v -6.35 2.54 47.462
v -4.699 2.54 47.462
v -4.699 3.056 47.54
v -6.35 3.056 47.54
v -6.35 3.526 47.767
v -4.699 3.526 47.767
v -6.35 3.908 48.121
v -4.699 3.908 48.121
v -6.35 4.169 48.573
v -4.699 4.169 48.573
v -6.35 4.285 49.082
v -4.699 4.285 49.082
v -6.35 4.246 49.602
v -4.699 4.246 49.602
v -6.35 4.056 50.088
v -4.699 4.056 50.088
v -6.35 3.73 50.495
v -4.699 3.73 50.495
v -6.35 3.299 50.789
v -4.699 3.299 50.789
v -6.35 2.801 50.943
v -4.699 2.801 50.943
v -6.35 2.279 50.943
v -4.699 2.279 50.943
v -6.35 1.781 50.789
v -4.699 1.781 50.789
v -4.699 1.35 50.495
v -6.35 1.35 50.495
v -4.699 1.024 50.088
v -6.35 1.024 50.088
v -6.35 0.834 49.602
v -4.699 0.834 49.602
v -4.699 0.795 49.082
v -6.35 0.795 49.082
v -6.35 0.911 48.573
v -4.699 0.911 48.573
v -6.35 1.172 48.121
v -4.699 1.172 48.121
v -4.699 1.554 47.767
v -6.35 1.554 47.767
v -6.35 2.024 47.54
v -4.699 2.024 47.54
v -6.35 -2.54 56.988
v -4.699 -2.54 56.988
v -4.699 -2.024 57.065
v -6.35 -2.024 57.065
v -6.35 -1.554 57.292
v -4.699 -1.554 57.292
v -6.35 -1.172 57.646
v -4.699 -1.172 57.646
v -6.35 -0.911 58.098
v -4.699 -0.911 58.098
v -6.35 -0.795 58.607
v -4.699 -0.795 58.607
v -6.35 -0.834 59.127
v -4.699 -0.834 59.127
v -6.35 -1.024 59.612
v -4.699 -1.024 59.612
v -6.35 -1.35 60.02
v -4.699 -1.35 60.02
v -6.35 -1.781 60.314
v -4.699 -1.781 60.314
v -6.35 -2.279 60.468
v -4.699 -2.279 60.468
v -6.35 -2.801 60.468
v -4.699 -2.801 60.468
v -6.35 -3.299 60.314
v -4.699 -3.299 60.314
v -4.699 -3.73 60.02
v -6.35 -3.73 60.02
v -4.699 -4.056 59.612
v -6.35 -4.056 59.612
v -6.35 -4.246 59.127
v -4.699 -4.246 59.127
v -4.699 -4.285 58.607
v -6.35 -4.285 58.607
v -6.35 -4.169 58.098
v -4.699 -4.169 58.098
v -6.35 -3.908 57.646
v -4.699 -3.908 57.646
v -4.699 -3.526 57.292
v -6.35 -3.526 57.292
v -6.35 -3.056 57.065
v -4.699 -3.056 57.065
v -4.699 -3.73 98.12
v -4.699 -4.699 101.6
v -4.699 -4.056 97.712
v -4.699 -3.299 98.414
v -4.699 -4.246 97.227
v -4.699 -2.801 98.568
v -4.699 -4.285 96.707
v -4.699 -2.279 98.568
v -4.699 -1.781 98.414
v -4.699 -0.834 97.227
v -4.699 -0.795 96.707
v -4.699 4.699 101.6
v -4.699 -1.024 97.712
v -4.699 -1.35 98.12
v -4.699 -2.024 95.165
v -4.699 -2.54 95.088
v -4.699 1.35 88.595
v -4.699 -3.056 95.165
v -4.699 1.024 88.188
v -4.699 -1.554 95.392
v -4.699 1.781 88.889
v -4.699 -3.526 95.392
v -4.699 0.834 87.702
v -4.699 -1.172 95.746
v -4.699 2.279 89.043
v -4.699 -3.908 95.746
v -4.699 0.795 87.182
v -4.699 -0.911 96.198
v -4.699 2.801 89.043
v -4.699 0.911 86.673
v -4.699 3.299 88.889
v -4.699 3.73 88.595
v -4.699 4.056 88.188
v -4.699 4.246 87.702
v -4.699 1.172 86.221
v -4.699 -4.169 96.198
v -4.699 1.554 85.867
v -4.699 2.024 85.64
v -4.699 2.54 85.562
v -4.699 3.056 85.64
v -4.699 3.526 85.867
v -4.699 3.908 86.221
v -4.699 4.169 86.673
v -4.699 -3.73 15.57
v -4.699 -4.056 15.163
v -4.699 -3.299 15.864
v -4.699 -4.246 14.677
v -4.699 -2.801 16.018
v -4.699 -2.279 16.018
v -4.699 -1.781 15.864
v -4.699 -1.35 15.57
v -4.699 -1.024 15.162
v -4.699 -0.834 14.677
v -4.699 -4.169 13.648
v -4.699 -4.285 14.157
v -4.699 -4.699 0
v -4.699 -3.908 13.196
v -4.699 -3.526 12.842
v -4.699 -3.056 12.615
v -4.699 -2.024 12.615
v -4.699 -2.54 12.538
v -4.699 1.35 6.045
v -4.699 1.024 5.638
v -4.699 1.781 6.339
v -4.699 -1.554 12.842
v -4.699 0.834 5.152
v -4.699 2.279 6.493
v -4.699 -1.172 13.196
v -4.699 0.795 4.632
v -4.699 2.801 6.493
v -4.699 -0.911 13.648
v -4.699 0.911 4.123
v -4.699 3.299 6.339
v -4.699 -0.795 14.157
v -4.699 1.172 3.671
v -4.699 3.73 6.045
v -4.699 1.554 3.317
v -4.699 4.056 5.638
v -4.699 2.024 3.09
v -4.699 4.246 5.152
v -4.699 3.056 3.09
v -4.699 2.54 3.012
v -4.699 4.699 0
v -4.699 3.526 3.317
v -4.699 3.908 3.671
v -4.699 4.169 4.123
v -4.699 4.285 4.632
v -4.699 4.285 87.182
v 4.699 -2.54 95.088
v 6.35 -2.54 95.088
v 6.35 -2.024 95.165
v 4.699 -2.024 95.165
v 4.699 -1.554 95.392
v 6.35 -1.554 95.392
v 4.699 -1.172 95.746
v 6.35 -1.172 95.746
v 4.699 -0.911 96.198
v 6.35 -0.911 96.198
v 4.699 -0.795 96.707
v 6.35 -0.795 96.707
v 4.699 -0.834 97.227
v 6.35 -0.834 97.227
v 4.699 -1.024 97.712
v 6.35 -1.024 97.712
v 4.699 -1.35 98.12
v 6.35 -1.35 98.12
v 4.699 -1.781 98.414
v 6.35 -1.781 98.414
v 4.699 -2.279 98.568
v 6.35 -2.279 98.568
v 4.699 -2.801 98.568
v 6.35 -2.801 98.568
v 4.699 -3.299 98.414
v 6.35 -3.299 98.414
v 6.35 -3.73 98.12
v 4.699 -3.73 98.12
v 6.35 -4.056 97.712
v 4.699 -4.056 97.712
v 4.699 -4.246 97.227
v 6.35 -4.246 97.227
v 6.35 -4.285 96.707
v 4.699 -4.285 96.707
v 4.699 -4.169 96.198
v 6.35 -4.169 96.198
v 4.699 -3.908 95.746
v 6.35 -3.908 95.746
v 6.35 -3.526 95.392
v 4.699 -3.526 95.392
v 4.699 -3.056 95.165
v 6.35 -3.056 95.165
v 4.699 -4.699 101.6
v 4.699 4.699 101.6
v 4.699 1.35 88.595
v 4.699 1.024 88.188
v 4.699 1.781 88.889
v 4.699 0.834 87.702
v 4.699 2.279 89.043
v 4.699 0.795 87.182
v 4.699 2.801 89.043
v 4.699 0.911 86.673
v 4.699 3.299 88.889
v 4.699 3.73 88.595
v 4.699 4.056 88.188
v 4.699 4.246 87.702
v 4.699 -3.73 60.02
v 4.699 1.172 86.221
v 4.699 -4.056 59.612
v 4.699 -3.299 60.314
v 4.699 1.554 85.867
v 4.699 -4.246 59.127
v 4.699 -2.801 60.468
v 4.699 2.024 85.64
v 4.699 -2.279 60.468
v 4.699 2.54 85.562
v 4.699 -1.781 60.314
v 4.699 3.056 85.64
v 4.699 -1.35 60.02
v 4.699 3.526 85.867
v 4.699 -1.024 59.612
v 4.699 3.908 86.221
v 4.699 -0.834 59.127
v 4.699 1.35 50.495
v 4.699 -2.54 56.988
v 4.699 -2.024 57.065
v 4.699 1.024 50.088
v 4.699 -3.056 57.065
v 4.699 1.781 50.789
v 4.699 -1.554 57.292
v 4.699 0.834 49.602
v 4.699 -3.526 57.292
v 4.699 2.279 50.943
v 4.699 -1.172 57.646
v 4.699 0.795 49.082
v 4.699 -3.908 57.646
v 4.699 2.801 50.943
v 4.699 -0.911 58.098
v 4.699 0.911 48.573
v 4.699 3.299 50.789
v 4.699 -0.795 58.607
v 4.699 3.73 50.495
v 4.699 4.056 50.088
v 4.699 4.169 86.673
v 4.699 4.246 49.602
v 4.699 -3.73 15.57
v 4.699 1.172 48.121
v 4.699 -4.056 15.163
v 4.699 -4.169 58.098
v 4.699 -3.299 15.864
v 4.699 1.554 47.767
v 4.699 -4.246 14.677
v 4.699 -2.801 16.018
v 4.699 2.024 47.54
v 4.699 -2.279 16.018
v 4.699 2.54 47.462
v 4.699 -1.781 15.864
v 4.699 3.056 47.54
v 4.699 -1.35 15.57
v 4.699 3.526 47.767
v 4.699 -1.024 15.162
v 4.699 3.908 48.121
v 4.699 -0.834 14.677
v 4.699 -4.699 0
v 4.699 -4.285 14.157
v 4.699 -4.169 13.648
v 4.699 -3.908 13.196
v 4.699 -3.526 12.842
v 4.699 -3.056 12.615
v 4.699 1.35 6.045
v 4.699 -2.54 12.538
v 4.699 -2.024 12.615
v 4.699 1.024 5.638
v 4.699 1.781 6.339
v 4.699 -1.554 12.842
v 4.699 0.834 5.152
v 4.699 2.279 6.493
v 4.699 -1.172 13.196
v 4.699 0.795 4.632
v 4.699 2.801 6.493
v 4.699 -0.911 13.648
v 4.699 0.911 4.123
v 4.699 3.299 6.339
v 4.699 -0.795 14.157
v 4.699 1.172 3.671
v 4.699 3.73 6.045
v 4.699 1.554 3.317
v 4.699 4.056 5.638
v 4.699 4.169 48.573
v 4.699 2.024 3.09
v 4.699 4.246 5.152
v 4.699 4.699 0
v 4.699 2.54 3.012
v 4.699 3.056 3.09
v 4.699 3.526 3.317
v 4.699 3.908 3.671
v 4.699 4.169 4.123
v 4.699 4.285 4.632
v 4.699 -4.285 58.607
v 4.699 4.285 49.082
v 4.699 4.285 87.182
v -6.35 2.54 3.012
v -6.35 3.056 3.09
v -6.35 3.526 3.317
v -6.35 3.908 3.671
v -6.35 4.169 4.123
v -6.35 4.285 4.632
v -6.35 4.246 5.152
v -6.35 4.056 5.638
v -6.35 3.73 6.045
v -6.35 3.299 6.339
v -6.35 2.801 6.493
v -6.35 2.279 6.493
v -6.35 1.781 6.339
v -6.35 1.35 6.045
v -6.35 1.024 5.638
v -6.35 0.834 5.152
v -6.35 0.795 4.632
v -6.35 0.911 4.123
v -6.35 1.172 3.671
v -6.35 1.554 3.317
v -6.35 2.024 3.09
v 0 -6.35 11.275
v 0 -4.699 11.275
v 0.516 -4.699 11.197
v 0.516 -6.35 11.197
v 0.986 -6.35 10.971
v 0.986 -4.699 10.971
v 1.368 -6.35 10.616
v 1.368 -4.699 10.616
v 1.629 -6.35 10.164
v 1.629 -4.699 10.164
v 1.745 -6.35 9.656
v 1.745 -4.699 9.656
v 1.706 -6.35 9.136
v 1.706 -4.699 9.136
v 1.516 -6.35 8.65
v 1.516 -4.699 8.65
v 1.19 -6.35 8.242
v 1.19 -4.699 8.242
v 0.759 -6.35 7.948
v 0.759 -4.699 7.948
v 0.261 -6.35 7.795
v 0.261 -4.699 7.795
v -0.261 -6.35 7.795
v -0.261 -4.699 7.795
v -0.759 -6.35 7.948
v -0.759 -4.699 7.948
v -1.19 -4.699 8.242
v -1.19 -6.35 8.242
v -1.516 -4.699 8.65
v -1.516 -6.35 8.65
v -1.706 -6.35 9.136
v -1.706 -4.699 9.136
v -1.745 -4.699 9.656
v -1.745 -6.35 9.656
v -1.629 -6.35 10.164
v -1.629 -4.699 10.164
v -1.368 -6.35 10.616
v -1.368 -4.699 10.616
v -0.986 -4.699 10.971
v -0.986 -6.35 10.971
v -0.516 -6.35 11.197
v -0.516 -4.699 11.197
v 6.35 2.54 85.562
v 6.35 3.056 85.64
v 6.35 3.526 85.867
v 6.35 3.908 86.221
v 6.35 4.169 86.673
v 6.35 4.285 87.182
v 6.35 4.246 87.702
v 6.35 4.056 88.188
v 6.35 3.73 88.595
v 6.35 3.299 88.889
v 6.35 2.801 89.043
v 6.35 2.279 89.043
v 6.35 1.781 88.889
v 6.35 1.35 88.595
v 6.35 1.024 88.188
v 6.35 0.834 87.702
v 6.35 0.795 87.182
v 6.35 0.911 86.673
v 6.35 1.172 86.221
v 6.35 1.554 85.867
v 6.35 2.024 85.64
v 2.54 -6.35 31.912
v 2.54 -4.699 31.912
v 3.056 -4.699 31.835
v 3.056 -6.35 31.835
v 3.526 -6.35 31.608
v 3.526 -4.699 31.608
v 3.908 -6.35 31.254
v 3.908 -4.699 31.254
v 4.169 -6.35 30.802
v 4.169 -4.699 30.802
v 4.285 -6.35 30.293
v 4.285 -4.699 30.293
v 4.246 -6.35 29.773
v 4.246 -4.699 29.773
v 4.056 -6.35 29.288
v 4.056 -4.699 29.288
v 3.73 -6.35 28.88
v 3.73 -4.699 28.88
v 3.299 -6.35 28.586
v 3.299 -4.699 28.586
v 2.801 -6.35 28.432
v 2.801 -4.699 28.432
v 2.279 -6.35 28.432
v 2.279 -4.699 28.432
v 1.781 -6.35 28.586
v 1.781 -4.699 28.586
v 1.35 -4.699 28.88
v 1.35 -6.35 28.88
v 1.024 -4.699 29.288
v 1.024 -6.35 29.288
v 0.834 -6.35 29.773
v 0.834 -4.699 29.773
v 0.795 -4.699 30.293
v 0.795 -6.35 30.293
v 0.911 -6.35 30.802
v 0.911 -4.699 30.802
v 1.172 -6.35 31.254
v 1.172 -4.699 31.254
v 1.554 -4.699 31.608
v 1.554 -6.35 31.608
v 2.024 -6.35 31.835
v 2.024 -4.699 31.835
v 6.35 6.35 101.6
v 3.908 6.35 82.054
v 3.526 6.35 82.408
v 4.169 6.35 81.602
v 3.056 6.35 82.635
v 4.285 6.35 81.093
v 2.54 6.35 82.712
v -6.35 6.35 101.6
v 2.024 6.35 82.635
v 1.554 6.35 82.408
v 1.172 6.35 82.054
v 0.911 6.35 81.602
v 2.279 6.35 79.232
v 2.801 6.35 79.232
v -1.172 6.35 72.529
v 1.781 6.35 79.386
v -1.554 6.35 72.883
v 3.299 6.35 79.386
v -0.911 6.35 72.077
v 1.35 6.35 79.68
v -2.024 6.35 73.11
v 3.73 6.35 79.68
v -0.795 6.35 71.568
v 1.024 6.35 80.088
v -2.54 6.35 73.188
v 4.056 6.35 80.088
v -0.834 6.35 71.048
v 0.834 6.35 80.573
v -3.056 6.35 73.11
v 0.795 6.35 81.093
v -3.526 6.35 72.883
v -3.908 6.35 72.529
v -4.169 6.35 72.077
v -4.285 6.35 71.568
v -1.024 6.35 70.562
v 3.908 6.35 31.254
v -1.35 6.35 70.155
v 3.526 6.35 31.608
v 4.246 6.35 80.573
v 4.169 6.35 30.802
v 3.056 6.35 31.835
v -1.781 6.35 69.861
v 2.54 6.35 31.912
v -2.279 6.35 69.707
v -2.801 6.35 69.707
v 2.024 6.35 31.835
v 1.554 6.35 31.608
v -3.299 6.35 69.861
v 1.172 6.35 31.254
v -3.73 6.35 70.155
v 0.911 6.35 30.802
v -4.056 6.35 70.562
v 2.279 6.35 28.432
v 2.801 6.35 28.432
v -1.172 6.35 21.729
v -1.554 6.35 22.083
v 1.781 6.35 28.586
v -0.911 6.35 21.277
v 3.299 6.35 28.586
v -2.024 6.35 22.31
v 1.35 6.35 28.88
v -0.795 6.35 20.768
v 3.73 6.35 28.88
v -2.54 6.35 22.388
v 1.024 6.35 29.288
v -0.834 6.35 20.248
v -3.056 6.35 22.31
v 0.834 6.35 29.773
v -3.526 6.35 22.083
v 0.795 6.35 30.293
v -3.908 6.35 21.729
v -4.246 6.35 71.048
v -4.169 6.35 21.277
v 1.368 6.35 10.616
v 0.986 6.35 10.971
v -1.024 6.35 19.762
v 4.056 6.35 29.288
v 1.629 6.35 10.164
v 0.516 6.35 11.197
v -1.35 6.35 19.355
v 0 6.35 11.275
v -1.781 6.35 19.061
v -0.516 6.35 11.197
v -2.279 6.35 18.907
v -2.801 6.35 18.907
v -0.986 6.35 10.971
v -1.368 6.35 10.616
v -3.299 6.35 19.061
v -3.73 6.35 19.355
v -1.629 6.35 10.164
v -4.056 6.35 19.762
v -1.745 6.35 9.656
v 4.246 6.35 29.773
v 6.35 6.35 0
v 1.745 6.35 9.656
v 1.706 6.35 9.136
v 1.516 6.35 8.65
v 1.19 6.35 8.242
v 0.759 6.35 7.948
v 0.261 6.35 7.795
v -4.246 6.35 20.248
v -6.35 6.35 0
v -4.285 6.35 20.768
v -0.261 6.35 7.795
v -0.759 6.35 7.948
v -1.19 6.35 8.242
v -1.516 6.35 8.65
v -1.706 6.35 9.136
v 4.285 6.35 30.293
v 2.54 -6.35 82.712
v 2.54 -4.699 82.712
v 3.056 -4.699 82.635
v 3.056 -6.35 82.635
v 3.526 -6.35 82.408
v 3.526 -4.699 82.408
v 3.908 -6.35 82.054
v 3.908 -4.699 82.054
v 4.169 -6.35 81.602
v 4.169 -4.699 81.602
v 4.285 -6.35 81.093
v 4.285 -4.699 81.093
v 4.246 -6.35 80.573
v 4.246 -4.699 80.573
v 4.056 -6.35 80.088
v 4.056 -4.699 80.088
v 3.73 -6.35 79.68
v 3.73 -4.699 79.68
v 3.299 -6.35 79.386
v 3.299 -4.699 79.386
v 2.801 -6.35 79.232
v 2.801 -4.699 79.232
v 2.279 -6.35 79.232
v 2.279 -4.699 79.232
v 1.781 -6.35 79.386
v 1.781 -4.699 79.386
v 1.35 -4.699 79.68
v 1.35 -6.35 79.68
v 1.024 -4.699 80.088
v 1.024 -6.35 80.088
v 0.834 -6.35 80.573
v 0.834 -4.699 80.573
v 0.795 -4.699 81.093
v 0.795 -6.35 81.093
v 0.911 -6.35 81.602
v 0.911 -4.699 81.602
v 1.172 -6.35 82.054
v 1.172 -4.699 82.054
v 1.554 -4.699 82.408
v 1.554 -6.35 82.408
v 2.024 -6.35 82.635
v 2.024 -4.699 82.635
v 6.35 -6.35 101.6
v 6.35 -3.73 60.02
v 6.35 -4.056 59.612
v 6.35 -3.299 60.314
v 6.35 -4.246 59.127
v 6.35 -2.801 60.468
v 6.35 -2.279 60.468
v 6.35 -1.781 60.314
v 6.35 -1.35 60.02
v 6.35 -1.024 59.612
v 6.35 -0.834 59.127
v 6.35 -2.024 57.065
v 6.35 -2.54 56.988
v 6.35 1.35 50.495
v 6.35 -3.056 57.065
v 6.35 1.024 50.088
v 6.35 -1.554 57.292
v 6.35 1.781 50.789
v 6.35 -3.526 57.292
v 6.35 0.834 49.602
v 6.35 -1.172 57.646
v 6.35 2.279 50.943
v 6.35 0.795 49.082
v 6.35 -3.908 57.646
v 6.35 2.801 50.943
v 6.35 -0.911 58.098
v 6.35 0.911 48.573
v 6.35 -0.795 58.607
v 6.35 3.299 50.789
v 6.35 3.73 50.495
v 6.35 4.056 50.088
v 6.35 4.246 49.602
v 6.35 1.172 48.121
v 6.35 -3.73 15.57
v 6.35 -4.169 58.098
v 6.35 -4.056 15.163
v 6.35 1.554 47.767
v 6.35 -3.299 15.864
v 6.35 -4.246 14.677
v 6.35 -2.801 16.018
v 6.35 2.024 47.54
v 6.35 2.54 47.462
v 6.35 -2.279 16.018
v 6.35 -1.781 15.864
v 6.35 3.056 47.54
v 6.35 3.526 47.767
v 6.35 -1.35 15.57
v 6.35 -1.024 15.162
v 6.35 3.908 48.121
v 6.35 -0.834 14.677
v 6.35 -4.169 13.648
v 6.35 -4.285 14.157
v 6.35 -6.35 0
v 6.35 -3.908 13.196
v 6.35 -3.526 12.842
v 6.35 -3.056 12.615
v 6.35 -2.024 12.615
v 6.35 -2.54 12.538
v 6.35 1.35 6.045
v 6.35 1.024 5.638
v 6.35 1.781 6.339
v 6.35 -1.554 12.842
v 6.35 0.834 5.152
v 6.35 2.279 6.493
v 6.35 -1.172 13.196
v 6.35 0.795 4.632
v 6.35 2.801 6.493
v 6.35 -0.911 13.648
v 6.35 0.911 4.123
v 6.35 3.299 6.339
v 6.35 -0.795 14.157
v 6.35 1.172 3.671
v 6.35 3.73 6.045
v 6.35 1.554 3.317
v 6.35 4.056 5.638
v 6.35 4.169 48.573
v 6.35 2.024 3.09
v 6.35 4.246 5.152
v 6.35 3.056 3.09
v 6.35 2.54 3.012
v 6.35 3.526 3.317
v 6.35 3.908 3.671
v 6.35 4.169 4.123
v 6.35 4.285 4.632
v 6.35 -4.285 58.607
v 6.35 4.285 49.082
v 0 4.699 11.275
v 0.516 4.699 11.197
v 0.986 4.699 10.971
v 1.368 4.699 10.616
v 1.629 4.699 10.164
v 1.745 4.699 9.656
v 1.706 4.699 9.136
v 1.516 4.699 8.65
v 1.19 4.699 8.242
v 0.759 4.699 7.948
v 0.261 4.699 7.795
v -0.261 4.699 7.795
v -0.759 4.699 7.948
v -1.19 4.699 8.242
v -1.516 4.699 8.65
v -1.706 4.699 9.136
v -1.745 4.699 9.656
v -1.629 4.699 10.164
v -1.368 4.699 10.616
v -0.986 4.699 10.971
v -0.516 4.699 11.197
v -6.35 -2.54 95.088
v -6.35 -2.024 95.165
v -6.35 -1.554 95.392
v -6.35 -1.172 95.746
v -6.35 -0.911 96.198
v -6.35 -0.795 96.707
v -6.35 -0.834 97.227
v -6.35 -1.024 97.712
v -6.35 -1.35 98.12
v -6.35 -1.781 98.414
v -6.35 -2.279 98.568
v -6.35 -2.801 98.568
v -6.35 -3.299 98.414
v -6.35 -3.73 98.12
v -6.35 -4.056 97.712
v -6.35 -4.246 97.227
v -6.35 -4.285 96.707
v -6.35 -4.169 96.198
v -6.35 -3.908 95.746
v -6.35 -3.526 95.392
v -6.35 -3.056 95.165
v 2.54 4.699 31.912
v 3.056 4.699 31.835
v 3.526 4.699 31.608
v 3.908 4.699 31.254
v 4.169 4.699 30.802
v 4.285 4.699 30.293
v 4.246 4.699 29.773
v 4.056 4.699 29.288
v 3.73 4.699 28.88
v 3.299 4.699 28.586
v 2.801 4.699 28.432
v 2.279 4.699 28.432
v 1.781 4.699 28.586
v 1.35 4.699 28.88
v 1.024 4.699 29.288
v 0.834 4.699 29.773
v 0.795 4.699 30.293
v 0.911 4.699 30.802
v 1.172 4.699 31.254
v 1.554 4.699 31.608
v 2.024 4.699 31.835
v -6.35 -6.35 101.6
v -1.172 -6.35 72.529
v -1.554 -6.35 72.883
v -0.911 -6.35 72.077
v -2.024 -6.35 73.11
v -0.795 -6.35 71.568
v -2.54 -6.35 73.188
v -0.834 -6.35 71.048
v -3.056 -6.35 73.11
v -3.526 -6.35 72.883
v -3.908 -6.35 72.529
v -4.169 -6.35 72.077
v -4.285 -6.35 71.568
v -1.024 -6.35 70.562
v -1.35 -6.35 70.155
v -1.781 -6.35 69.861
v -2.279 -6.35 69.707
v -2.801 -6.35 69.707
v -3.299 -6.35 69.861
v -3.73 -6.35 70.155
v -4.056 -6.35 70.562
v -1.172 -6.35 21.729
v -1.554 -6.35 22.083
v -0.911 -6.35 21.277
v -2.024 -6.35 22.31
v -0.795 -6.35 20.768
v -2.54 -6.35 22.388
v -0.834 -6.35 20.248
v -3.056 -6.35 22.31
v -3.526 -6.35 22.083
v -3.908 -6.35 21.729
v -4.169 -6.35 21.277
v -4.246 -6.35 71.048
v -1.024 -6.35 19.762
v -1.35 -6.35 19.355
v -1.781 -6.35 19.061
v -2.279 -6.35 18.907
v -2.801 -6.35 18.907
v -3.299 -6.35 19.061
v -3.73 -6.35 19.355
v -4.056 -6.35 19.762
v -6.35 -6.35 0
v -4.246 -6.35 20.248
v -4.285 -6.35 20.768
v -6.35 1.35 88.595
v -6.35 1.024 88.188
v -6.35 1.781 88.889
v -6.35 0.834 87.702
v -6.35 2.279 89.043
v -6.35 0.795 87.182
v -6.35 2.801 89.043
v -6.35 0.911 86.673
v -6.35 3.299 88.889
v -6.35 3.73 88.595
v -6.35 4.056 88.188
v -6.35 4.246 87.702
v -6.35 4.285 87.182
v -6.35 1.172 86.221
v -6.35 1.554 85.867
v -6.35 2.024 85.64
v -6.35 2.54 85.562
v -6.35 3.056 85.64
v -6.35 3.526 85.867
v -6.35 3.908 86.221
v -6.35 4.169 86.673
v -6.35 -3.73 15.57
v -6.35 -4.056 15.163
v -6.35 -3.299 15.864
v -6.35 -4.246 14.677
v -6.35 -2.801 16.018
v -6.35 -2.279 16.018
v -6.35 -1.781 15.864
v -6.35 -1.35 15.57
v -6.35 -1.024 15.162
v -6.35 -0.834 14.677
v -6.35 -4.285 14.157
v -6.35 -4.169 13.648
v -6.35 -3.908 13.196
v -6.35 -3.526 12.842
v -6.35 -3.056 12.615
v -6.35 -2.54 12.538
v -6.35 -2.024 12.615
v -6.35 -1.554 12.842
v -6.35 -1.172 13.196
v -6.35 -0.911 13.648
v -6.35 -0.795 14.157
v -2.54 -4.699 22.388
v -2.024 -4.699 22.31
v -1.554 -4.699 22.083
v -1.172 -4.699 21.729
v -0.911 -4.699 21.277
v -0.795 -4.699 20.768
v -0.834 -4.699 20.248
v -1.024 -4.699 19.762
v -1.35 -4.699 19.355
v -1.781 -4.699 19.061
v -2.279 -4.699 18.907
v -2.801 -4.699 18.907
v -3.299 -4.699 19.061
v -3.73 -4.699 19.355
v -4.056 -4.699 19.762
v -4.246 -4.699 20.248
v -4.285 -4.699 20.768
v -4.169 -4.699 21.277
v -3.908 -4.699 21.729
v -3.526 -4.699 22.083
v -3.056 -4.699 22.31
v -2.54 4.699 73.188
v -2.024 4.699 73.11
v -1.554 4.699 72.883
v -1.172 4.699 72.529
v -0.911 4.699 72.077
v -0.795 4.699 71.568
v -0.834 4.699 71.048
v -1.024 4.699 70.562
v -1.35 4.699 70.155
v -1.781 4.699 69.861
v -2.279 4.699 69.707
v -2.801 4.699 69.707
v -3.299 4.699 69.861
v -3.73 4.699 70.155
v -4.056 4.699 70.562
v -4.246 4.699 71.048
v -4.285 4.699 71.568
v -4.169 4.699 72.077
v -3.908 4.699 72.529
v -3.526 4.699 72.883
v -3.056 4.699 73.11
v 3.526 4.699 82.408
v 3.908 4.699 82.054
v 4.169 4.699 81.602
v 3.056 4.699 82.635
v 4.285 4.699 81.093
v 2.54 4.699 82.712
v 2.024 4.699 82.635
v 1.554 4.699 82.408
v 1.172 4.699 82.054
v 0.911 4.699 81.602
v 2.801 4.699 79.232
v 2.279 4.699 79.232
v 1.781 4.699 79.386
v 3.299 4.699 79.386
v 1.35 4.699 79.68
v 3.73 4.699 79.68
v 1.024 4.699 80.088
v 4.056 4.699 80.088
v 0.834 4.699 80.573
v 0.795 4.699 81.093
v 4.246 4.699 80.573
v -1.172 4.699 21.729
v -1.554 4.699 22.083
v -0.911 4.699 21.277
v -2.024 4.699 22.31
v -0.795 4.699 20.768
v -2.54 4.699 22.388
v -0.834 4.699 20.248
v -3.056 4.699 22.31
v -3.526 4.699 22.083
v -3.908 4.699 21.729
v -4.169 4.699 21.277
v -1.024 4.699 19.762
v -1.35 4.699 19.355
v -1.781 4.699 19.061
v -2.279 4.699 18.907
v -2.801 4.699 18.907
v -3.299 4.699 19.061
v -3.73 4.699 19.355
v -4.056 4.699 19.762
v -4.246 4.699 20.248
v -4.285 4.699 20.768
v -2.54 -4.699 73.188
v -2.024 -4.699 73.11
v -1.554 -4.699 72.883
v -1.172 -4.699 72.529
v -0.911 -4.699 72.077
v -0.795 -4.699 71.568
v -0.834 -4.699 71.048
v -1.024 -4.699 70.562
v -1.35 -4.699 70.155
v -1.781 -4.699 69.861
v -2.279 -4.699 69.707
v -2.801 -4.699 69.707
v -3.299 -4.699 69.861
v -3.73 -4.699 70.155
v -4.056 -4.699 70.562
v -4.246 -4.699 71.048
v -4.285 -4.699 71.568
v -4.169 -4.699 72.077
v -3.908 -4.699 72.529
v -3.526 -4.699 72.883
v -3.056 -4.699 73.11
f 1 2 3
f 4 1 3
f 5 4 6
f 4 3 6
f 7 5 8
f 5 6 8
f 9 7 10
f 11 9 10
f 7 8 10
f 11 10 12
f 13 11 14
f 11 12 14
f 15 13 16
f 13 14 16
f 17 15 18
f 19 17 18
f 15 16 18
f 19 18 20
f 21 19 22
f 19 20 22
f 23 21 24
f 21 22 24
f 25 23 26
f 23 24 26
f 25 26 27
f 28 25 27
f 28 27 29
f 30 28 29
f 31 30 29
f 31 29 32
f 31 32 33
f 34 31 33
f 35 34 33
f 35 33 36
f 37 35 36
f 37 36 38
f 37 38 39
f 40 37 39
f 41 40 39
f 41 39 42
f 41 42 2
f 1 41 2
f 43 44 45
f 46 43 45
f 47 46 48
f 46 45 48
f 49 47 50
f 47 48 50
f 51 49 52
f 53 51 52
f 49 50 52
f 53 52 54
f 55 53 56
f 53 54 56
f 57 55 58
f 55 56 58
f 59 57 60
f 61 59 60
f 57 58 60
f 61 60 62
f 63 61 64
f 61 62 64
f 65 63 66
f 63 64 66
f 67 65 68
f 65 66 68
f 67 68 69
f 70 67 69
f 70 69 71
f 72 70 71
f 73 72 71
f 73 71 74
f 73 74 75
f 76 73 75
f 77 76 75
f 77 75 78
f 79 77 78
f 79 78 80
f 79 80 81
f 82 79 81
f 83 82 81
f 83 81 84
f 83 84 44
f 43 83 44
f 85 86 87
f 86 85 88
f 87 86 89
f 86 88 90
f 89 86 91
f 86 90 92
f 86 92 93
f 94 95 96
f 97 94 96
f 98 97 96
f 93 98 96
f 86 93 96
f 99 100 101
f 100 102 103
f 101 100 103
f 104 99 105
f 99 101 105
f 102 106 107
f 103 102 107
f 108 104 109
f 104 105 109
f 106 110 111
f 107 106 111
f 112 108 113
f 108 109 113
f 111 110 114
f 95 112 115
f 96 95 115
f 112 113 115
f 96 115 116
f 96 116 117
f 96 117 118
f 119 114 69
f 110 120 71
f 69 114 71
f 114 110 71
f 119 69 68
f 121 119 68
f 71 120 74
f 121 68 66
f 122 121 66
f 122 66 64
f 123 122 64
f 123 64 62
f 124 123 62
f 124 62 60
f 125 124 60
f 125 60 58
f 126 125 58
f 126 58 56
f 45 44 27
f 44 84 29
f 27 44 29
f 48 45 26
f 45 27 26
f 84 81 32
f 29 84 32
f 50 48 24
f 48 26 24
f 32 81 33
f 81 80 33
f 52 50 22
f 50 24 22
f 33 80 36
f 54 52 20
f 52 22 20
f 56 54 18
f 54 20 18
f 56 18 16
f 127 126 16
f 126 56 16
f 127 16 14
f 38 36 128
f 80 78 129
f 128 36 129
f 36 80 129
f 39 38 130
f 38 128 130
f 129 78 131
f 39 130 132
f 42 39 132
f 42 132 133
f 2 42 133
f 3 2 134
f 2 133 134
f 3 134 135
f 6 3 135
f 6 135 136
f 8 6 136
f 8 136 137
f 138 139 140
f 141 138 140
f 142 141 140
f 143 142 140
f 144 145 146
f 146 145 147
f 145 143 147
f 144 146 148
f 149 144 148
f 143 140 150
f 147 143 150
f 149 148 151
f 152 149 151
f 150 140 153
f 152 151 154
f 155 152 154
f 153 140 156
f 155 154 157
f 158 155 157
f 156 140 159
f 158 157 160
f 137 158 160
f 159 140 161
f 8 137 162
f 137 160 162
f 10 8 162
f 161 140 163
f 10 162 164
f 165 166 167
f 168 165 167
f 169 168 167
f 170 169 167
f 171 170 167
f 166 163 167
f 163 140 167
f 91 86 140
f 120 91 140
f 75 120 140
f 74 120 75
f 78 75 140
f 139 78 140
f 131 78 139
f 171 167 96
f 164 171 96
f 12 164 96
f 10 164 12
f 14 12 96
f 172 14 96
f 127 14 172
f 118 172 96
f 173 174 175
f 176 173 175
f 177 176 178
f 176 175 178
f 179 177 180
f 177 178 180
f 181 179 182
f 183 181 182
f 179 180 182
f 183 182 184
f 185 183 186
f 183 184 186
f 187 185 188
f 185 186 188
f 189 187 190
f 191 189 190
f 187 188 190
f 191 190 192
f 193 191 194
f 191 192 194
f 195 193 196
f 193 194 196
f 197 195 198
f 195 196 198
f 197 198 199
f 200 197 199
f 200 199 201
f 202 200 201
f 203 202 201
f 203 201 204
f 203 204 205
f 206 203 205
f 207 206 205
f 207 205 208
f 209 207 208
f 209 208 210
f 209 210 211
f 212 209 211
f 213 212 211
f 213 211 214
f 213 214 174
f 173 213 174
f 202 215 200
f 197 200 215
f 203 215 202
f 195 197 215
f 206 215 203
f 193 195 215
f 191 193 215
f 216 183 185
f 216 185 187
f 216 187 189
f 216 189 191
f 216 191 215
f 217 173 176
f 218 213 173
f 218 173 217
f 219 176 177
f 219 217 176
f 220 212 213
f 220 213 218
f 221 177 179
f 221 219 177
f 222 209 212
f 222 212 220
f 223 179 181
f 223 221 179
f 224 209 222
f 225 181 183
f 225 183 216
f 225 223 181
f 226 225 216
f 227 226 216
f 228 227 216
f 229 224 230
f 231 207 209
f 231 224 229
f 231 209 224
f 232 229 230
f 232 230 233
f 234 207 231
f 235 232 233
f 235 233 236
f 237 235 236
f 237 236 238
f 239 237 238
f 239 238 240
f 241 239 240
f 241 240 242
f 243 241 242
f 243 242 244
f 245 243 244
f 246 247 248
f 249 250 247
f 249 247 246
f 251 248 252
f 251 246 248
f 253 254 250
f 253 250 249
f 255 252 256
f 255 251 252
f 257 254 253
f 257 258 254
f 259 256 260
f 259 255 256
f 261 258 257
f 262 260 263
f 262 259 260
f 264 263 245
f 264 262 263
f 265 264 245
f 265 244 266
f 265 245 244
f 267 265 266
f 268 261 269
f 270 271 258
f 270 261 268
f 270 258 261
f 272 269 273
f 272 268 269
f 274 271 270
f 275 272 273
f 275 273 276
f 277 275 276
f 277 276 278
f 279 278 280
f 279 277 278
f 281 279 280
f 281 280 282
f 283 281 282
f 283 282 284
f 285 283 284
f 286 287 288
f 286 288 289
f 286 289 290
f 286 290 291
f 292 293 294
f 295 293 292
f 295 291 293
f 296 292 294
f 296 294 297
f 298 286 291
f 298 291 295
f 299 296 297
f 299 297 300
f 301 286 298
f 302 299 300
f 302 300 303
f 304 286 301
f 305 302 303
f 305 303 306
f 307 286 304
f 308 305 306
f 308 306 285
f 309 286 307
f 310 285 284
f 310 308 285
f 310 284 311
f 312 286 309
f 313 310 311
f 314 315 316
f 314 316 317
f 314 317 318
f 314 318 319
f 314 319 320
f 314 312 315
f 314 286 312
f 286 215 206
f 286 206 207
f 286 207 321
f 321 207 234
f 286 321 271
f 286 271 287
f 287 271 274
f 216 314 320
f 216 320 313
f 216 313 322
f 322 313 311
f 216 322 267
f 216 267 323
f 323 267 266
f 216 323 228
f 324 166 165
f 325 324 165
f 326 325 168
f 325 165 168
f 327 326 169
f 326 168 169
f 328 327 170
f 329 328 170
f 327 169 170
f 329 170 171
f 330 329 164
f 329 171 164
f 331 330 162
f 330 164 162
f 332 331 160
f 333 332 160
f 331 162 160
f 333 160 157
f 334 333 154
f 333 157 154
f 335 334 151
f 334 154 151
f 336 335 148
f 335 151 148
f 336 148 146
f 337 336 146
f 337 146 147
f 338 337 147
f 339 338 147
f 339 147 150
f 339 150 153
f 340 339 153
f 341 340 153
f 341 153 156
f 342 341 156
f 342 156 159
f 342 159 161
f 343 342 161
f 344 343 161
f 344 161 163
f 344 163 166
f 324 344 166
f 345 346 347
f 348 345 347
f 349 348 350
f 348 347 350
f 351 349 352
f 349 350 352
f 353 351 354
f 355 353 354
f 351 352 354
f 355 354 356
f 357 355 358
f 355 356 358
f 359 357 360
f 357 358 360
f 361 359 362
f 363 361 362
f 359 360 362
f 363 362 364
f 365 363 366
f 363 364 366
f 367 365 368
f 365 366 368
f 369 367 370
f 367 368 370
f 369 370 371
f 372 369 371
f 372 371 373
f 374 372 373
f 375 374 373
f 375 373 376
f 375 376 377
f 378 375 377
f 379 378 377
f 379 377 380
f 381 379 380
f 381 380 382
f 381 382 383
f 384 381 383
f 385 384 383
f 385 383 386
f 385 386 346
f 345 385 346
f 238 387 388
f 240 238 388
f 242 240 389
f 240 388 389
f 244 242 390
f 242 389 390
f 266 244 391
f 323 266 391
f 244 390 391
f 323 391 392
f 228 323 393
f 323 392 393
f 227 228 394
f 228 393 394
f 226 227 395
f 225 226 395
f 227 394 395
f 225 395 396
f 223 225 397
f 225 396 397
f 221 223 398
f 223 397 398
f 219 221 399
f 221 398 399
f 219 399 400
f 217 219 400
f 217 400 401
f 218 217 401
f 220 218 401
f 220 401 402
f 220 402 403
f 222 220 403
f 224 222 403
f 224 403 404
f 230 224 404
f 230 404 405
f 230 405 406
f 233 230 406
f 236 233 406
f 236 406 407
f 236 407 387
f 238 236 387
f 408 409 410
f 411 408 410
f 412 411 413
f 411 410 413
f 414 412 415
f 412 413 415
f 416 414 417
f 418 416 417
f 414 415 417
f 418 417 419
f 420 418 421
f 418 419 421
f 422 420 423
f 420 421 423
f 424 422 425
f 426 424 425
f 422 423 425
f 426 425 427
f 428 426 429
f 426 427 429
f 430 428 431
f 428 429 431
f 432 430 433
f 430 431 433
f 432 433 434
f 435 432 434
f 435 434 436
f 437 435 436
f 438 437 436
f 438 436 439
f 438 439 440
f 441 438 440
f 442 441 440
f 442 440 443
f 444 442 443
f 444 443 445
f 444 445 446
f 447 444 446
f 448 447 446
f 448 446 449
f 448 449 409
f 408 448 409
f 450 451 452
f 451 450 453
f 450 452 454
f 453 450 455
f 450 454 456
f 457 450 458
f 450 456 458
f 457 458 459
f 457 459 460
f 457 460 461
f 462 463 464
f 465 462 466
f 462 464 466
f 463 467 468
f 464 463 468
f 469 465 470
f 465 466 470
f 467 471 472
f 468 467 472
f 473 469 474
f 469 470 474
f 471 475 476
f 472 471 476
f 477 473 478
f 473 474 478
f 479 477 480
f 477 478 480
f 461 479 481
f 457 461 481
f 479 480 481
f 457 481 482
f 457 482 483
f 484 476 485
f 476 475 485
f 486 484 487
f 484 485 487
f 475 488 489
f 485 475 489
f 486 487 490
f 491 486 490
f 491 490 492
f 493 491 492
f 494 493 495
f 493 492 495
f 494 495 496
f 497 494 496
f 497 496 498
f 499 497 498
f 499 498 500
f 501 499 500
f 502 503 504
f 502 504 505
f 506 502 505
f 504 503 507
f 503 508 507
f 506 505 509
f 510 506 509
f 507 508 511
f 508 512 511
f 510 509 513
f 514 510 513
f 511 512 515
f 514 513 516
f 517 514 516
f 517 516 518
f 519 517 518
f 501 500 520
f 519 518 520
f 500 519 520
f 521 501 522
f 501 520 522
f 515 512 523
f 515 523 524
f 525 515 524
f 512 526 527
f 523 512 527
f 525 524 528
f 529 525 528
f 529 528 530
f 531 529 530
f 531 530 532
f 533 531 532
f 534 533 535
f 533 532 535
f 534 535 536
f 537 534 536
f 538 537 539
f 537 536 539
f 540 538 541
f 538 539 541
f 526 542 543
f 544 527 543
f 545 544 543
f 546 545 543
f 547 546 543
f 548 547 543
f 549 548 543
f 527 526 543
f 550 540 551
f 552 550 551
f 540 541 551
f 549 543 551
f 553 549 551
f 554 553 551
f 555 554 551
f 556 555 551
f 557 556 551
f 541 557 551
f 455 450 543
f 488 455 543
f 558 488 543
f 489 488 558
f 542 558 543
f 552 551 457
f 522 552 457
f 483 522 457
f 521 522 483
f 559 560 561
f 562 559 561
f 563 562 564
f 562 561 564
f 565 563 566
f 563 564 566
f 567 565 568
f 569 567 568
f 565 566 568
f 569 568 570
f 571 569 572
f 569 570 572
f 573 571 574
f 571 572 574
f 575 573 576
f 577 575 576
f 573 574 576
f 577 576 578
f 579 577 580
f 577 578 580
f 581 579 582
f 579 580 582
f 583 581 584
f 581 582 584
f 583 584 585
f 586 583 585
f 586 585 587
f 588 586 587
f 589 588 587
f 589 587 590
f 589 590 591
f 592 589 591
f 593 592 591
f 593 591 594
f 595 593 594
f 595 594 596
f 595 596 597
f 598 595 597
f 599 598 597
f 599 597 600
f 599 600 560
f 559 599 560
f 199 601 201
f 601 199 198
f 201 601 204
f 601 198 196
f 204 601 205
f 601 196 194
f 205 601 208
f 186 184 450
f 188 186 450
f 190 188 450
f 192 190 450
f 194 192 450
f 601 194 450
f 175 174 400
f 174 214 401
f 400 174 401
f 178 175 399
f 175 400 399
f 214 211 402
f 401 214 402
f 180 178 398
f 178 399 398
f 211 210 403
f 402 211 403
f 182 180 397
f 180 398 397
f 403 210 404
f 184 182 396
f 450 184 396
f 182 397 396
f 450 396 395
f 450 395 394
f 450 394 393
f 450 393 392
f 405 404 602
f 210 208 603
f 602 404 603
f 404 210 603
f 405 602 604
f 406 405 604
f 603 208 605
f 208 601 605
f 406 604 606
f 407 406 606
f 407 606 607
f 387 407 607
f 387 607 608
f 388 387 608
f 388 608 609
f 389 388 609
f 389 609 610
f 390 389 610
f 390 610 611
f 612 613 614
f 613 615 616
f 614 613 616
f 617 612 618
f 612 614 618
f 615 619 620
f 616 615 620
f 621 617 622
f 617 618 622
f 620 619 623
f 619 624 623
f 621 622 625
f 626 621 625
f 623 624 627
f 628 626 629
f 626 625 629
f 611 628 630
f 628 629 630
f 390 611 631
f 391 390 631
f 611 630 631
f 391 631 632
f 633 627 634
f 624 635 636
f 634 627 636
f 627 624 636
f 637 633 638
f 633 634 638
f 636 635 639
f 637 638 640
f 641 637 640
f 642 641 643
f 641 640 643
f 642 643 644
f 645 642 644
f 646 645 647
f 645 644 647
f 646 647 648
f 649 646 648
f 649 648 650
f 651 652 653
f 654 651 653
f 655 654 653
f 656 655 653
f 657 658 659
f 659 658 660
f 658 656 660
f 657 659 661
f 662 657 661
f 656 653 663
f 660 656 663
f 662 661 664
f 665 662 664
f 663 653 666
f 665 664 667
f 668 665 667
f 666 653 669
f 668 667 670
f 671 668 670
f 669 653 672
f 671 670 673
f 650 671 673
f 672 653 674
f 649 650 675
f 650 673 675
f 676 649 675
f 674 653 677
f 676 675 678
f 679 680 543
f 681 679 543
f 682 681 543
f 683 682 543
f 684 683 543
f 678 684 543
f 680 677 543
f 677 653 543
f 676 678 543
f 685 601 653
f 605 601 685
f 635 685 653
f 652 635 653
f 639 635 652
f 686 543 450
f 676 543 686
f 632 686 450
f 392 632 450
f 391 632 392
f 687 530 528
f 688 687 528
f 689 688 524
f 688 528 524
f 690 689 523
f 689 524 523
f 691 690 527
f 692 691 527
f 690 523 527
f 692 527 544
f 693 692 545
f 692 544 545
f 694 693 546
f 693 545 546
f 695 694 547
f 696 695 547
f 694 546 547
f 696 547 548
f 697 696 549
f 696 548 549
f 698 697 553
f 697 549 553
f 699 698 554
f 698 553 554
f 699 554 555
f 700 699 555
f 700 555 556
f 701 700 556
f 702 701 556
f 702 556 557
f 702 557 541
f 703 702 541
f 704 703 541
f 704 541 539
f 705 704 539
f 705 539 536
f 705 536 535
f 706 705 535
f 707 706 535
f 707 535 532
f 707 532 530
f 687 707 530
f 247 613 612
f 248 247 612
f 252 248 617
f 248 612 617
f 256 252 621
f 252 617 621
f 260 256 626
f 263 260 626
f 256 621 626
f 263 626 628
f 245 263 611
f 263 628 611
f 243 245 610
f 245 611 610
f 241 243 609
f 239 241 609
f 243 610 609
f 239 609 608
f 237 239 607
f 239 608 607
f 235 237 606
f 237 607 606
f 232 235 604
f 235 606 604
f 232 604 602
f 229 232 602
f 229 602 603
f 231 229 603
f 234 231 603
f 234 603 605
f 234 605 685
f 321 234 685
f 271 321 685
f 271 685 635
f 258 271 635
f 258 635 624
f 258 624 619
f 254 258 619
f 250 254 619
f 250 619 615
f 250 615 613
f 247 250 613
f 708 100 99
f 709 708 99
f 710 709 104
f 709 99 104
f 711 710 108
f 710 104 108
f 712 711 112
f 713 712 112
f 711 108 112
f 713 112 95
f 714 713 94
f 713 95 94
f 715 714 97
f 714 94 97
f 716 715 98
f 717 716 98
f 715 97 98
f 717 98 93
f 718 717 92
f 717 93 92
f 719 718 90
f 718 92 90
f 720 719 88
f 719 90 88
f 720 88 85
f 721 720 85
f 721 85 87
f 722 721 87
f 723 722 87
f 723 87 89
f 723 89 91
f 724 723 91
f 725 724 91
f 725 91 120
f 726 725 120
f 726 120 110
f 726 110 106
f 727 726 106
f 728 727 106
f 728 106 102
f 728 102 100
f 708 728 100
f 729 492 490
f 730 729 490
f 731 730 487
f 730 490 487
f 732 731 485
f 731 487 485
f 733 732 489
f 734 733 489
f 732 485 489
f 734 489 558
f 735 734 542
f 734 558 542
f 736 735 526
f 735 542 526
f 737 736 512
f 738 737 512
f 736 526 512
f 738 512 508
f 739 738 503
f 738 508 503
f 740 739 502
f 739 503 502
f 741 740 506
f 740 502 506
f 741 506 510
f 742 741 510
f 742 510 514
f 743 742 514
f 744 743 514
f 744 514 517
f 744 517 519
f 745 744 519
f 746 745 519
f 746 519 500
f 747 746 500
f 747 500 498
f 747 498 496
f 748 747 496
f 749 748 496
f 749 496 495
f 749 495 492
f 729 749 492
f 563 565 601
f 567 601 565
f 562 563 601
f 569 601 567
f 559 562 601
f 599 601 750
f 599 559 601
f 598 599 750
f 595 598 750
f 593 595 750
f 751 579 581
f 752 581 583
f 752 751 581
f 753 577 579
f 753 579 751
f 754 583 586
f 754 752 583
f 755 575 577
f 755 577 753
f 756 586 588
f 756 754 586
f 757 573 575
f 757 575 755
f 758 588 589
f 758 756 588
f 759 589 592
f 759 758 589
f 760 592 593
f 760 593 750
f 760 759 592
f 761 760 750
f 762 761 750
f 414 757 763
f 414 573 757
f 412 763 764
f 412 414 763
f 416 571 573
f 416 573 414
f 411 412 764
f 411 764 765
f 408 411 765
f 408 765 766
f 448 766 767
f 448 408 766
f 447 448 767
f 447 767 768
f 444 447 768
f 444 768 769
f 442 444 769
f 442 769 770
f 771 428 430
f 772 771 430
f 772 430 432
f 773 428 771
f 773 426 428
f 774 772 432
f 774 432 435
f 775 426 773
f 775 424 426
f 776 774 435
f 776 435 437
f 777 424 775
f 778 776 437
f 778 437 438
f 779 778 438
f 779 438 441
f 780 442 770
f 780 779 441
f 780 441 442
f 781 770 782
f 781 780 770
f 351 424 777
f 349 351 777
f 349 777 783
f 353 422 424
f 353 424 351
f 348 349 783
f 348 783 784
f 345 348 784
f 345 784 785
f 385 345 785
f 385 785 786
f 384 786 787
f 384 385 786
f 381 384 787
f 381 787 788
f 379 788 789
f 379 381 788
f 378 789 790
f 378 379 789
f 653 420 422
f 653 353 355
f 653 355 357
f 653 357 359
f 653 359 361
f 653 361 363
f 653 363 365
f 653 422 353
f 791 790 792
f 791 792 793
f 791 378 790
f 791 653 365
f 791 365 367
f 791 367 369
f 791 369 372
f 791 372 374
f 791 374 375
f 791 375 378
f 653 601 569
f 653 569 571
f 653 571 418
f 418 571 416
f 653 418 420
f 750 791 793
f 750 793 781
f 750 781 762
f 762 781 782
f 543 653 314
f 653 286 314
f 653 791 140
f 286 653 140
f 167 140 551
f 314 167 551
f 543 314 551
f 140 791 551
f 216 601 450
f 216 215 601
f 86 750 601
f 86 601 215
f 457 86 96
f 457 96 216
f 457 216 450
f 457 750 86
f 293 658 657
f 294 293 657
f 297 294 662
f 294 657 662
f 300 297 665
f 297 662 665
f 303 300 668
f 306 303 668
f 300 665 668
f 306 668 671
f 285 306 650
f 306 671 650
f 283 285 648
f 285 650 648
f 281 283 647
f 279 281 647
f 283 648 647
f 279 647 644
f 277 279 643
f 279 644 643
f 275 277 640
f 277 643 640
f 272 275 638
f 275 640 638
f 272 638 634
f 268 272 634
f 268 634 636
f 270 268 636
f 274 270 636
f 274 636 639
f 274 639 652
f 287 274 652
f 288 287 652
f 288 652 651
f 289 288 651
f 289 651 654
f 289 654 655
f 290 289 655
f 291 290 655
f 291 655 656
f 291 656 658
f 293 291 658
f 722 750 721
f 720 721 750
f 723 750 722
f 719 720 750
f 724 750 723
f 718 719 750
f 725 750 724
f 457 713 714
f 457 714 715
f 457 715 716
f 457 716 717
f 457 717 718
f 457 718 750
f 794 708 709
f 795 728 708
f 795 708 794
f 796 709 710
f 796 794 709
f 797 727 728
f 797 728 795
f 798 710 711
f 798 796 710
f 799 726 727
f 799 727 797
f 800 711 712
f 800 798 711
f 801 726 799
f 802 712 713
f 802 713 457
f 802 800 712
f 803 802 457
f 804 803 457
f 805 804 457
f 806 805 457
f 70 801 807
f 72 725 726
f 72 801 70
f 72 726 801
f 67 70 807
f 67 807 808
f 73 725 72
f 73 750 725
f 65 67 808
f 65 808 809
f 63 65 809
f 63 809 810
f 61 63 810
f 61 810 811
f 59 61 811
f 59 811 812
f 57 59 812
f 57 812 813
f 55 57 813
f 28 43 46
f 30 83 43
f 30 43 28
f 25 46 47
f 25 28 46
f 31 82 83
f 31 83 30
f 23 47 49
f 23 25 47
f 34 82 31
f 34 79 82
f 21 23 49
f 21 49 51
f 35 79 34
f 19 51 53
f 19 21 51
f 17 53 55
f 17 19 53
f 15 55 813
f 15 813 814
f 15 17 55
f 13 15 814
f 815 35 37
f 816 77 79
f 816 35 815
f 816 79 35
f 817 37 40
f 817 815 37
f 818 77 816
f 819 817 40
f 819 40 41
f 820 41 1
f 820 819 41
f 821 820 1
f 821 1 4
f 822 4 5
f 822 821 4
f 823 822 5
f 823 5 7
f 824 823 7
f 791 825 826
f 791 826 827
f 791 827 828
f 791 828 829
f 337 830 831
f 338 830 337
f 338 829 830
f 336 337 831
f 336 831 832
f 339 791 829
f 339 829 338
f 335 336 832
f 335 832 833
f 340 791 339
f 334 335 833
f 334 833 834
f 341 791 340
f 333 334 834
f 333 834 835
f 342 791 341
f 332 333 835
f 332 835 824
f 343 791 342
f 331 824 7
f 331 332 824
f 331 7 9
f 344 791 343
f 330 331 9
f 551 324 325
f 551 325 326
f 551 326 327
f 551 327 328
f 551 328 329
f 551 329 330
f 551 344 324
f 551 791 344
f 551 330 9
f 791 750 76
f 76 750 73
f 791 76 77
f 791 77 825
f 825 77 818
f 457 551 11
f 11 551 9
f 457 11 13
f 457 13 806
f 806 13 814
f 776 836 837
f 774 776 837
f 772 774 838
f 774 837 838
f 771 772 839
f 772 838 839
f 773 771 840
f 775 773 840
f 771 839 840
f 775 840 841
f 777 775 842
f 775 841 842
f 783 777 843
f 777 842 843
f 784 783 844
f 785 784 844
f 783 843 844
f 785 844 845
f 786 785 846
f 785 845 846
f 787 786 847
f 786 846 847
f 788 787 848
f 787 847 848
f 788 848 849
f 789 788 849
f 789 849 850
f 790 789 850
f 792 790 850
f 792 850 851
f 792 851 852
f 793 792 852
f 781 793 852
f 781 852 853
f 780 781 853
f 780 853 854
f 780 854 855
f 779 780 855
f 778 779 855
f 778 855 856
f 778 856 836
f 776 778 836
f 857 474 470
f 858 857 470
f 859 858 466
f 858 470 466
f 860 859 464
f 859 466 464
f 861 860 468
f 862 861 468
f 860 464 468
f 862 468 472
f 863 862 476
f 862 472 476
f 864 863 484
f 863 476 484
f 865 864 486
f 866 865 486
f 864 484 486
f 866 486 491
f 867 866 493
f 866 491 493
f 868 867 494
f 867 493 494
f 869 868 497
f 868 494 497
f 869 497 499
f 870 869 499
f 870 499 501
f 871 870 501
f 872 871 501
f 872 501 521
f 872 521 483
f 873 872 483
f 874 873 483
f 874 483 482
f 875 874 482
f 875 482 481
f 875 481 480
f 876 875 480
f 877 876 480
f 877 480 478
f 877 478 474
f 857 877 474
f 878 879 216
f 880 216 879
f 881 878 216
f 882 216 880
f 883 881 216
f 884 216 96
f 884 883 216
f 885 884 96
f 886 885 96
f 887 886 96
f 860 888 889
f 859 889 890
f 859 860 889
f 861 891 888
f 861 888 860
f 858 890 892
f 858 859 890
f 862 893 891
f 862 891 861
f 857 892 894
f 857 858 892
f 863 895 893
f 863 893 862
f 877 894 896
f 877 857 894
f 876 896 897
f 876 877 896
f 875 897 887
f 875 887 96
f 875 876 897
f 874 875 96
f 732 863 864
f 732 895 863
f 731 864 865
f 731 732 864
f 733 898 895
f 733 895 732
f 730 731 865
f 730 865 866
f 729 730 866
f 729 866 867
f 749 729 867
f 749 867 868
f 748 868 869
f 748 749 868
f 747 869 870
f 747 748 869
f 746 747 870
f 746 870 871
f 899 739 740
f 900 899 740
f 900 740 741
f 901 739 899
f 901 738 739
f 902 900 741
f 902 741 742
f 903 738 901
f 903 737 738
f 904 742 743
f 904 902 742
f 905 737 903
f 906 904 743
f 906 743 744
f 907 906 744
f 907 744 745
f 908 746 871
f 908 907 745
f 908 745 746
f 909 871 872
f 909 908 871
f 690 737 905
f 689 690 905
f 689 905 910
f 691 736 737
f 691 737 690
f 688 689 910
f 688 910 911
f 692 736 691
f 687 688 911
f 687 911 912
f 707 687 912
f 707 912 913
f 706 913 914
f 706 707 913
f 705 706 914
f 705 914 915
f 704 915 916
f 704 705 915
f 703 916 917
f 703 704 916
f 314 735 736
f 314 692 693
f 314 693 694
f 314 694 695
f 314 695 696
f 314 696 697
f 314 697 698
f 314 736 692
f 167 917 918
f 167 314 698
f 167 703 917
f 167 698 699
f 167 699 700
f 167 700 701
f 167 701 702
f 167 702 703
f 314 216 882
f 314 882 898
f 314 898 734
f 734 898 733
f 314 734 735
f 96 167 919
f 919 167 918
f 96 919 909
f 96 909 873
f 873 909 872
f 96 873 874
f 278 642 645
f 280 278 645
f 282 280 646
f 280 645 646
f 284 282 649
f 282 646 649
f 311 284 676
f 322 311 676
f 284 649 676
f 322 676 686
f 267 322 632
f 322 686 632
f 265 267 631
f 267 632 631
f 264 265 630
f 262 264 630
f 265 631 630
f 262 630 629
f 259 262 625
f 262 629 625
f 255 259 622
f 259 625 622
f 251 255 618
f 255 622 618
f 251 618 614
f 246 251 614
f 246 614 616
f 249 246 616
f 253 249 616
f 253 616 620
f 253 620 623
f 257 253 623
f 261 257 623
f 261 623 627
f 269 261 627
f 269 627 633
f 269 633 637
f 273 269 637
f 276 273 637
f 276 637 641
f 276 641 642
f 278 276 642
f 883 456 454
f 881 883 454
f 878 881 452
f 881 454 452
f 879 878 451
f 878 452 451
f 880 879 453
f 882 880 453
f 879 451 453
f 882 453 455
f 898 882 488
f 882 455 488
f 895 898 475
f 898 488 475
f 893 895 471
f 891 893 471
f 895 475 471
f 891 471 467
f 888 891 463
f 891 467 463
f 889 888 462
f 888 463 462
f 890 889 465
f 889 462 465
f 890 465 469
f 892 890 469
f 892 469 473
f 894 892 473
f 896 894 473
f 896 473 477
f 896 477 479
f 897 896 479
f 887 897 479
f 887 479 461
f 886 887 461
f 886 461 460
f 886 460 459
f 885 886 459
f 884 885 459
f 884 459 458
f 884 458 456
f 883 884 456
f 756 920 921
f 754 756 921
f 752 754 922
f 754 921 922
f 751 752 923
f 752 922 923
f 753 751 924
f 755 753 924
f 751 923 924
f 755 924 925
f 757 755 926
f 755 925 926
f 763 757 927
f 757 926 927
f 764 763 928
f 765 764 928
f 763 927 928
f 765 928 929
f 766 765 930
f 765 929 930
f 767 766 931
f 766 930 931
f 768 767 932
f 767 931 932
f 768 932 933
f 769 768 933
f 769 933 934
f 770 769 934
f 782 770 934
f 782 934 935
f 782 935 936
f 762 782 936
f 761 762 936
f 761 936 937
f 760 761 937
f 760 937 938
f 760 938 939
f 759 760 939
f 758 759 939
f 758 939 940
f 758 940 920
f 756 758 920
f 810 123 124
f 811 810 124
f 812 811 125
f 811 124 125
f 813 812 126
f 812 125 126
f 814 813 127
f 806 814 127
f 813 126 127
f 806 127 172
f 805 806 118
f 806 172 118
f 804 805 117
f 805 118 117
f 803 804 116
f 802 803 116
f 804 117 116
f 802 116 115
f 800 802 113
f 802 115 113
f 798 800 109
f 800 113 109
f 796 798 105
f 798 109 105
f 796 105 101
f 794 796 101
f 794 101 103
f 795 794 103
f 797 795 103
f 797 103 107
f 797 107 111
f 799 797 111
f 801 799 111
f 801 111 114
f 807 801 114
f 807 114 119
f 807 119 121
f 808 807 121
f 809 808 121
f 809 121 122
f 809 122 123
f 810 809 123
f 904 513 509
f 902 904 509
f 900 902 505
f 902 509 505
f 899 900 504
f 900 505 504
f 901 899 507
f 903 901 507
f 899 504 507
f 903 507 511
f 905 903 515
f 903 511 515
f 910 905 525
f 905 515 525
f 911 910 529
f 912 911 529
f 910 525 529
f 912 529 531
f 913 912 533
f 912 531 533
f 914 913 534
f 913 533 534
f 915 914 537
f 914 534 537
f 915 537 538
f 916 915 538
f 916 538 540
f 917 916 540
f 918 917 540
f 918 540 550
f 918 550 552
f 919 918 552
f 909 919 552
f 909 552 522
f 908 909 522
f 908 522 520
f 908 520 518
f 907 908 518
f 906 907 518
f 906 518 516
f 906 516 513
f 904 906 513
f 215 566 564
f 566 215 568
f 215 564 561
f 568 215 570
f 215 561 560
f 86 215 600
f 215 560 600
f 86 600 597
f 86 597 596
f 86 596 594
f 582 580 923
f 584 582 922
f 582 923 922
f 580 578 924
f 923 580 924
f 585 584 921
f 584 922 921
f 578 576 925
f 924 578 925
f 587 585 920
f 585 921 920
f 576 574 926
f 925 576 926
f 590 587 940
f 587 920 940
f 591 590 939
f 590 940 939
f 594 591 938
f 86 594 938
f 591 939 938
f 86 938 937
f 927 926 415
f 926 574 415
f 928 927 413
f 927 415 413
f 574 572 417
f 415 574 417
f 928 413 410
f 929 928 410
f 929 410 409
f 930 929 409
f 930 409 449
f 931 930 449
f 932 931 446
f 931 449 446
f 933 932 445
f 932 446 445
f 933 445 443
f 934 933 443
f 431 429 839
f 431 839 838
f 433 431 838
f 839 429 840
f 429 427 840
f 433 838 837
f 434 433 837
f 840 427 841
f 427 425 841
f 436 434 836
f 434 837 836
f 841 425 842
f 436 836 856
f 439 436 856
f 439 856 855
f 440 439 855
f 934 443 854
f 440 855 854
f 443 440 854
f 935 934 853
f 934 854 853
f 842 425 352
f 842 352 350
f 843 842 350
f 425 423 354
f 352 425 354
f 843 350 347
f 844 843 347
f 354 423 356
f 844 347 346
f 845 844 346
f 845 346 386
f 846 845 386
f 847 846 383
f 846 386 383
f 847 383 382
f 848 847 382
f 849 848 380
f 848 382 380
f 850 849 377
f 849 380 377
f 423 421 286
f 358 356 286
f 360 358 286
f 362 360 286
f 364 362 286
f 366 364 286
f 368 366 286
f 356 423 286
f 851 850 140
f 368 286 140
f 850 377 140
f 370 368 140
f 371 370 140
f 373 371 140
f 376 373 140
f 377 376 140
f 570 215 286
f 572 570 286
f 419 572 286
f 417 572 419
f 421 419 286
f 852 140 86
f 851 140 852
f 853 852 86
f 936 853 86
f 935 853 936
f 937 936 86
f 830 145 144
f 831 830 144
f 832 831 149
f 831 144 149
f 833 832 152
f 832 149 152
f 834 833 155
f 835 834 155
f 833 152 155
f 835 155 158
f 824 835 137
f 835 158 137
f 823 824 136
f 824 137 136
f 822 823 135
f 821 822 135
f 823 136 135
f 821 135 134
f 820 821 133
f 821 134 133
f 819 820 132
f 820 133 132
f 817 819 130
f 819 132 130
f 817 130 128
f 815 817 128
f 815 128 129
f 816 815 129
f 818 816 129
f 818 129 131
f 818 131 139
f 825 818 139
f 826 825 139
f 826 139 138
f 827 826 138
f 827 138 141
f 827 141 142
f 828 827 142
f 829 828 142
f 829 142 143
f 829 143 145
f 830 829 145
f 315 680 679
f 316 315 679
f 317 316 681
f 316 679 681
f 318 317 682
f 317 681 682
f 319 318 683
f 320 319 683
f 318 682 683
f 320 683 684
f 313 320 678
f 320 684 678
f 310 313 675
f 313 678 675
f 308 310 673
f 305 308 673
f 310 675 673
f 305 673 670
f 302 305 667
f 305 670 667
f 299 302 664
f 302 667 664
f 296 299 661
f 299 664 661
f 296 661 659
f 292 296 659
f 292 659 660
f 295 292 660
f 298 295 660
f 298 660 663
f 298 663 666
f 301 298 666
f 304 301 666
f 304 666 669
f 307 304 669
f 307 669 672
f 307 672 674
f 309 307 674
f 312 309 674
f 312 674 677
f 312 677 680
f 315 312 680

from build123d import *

# Parameters (mm, degrees)
SKETCH1_W           = 12.7
SKETCH1_H           = 12.7
SKETCH1_W_2         = 9.398
SKETCH1_H_2         = 9.398
BOSS_EXTRUDE1_DEPTH = 101.6
SKETCH2_R           = 1.75
CUT_EXTRUDE1_DEPTH  = 22.2885
SKETCH3_R           = 1.75
CUT_EXTRUDE2_DEPTH  = 22.098
SKETCH4_R           = 1.75
CUT_EXTRUDE3_DEPTH  = 24.892


with BuildPart() as part:
    # Sketch1 → Boss-Extrude1 (new body)
    with BuildSketch(Plane(origin=(0, 0, 0), x_dir=(0, 1, 0), z_dir=(0, 0, 1))):
        Rectangle(SKETCH1_W, SKETCH1_H)
        Rectangle(SKETCH1_W_2, SKETCH1_H_2, mode=Mode.SUBTRACT)
    extrude(amount=BOSS_EXTRUDE1_DEPTH)

    # Sketch2 → Cut-Extrude1 (cut)
    with BuildSketch(Plane(origin=(0, 6.35, 0), x_dir=(-1, 0, 0), z_dir=(0, 1, 0))):
        with Locations((-2.54, 80.9625)):
            Circle(SKETCH2_R)
        with Locations((2.54, 71.4375)):
            Circle(SKETCH2_R)
        with Locations((-2.54, 30.1625)):
            Circle(SKETCH2_R)
        with Locations((2.54, 20.6375)):
            Circle(SKETCH2_R)
    extrude(amount=-CUT_EXTRUDE1_DEPTH, mode=Mode.SUBTRACT)

    # Sketch3 → Cut-Extrude2 (cut)
    with BuildSketch(Plane.YZ.offset(6.35)):
        with Locations((-2.54, 14.2875)):
            Circle(SKETCH3_R)
        with Locations((2.54, 4.7625)):
            Circle(SKETCH3_R)
        with Locations((-2.54, 96.8375)):
            Circle(SKETCH3_R)
        with Locations((2.54, 87.3125)):
            Circle(SKETCH3_R)
        with Locations((-2.54, 58.7375)):
            Circle(SKETCH3_R)
        with Locations((2.54, 49.2125)):
            Circle(SKETCH3_R)
    extrude(amount=-CUT_EXTRUDE2_DEPTH, mode=Mode.SUBTRACT)

    # Sketch4 → Cut-Extrude3 (cut)
    with BuildSketch(Plane(origin=(0, 6.35, 0), x_dir=(-1, 0, 0), z_dir=(0, 1, 0))):
        with Locations((0, 9.525)):
            Circle(SKETCH4_R)
    extrude(amount=-CUT_EXTRUDE3_DEPTH, mode=Mode.SUBTRACT)


solid = part.part
